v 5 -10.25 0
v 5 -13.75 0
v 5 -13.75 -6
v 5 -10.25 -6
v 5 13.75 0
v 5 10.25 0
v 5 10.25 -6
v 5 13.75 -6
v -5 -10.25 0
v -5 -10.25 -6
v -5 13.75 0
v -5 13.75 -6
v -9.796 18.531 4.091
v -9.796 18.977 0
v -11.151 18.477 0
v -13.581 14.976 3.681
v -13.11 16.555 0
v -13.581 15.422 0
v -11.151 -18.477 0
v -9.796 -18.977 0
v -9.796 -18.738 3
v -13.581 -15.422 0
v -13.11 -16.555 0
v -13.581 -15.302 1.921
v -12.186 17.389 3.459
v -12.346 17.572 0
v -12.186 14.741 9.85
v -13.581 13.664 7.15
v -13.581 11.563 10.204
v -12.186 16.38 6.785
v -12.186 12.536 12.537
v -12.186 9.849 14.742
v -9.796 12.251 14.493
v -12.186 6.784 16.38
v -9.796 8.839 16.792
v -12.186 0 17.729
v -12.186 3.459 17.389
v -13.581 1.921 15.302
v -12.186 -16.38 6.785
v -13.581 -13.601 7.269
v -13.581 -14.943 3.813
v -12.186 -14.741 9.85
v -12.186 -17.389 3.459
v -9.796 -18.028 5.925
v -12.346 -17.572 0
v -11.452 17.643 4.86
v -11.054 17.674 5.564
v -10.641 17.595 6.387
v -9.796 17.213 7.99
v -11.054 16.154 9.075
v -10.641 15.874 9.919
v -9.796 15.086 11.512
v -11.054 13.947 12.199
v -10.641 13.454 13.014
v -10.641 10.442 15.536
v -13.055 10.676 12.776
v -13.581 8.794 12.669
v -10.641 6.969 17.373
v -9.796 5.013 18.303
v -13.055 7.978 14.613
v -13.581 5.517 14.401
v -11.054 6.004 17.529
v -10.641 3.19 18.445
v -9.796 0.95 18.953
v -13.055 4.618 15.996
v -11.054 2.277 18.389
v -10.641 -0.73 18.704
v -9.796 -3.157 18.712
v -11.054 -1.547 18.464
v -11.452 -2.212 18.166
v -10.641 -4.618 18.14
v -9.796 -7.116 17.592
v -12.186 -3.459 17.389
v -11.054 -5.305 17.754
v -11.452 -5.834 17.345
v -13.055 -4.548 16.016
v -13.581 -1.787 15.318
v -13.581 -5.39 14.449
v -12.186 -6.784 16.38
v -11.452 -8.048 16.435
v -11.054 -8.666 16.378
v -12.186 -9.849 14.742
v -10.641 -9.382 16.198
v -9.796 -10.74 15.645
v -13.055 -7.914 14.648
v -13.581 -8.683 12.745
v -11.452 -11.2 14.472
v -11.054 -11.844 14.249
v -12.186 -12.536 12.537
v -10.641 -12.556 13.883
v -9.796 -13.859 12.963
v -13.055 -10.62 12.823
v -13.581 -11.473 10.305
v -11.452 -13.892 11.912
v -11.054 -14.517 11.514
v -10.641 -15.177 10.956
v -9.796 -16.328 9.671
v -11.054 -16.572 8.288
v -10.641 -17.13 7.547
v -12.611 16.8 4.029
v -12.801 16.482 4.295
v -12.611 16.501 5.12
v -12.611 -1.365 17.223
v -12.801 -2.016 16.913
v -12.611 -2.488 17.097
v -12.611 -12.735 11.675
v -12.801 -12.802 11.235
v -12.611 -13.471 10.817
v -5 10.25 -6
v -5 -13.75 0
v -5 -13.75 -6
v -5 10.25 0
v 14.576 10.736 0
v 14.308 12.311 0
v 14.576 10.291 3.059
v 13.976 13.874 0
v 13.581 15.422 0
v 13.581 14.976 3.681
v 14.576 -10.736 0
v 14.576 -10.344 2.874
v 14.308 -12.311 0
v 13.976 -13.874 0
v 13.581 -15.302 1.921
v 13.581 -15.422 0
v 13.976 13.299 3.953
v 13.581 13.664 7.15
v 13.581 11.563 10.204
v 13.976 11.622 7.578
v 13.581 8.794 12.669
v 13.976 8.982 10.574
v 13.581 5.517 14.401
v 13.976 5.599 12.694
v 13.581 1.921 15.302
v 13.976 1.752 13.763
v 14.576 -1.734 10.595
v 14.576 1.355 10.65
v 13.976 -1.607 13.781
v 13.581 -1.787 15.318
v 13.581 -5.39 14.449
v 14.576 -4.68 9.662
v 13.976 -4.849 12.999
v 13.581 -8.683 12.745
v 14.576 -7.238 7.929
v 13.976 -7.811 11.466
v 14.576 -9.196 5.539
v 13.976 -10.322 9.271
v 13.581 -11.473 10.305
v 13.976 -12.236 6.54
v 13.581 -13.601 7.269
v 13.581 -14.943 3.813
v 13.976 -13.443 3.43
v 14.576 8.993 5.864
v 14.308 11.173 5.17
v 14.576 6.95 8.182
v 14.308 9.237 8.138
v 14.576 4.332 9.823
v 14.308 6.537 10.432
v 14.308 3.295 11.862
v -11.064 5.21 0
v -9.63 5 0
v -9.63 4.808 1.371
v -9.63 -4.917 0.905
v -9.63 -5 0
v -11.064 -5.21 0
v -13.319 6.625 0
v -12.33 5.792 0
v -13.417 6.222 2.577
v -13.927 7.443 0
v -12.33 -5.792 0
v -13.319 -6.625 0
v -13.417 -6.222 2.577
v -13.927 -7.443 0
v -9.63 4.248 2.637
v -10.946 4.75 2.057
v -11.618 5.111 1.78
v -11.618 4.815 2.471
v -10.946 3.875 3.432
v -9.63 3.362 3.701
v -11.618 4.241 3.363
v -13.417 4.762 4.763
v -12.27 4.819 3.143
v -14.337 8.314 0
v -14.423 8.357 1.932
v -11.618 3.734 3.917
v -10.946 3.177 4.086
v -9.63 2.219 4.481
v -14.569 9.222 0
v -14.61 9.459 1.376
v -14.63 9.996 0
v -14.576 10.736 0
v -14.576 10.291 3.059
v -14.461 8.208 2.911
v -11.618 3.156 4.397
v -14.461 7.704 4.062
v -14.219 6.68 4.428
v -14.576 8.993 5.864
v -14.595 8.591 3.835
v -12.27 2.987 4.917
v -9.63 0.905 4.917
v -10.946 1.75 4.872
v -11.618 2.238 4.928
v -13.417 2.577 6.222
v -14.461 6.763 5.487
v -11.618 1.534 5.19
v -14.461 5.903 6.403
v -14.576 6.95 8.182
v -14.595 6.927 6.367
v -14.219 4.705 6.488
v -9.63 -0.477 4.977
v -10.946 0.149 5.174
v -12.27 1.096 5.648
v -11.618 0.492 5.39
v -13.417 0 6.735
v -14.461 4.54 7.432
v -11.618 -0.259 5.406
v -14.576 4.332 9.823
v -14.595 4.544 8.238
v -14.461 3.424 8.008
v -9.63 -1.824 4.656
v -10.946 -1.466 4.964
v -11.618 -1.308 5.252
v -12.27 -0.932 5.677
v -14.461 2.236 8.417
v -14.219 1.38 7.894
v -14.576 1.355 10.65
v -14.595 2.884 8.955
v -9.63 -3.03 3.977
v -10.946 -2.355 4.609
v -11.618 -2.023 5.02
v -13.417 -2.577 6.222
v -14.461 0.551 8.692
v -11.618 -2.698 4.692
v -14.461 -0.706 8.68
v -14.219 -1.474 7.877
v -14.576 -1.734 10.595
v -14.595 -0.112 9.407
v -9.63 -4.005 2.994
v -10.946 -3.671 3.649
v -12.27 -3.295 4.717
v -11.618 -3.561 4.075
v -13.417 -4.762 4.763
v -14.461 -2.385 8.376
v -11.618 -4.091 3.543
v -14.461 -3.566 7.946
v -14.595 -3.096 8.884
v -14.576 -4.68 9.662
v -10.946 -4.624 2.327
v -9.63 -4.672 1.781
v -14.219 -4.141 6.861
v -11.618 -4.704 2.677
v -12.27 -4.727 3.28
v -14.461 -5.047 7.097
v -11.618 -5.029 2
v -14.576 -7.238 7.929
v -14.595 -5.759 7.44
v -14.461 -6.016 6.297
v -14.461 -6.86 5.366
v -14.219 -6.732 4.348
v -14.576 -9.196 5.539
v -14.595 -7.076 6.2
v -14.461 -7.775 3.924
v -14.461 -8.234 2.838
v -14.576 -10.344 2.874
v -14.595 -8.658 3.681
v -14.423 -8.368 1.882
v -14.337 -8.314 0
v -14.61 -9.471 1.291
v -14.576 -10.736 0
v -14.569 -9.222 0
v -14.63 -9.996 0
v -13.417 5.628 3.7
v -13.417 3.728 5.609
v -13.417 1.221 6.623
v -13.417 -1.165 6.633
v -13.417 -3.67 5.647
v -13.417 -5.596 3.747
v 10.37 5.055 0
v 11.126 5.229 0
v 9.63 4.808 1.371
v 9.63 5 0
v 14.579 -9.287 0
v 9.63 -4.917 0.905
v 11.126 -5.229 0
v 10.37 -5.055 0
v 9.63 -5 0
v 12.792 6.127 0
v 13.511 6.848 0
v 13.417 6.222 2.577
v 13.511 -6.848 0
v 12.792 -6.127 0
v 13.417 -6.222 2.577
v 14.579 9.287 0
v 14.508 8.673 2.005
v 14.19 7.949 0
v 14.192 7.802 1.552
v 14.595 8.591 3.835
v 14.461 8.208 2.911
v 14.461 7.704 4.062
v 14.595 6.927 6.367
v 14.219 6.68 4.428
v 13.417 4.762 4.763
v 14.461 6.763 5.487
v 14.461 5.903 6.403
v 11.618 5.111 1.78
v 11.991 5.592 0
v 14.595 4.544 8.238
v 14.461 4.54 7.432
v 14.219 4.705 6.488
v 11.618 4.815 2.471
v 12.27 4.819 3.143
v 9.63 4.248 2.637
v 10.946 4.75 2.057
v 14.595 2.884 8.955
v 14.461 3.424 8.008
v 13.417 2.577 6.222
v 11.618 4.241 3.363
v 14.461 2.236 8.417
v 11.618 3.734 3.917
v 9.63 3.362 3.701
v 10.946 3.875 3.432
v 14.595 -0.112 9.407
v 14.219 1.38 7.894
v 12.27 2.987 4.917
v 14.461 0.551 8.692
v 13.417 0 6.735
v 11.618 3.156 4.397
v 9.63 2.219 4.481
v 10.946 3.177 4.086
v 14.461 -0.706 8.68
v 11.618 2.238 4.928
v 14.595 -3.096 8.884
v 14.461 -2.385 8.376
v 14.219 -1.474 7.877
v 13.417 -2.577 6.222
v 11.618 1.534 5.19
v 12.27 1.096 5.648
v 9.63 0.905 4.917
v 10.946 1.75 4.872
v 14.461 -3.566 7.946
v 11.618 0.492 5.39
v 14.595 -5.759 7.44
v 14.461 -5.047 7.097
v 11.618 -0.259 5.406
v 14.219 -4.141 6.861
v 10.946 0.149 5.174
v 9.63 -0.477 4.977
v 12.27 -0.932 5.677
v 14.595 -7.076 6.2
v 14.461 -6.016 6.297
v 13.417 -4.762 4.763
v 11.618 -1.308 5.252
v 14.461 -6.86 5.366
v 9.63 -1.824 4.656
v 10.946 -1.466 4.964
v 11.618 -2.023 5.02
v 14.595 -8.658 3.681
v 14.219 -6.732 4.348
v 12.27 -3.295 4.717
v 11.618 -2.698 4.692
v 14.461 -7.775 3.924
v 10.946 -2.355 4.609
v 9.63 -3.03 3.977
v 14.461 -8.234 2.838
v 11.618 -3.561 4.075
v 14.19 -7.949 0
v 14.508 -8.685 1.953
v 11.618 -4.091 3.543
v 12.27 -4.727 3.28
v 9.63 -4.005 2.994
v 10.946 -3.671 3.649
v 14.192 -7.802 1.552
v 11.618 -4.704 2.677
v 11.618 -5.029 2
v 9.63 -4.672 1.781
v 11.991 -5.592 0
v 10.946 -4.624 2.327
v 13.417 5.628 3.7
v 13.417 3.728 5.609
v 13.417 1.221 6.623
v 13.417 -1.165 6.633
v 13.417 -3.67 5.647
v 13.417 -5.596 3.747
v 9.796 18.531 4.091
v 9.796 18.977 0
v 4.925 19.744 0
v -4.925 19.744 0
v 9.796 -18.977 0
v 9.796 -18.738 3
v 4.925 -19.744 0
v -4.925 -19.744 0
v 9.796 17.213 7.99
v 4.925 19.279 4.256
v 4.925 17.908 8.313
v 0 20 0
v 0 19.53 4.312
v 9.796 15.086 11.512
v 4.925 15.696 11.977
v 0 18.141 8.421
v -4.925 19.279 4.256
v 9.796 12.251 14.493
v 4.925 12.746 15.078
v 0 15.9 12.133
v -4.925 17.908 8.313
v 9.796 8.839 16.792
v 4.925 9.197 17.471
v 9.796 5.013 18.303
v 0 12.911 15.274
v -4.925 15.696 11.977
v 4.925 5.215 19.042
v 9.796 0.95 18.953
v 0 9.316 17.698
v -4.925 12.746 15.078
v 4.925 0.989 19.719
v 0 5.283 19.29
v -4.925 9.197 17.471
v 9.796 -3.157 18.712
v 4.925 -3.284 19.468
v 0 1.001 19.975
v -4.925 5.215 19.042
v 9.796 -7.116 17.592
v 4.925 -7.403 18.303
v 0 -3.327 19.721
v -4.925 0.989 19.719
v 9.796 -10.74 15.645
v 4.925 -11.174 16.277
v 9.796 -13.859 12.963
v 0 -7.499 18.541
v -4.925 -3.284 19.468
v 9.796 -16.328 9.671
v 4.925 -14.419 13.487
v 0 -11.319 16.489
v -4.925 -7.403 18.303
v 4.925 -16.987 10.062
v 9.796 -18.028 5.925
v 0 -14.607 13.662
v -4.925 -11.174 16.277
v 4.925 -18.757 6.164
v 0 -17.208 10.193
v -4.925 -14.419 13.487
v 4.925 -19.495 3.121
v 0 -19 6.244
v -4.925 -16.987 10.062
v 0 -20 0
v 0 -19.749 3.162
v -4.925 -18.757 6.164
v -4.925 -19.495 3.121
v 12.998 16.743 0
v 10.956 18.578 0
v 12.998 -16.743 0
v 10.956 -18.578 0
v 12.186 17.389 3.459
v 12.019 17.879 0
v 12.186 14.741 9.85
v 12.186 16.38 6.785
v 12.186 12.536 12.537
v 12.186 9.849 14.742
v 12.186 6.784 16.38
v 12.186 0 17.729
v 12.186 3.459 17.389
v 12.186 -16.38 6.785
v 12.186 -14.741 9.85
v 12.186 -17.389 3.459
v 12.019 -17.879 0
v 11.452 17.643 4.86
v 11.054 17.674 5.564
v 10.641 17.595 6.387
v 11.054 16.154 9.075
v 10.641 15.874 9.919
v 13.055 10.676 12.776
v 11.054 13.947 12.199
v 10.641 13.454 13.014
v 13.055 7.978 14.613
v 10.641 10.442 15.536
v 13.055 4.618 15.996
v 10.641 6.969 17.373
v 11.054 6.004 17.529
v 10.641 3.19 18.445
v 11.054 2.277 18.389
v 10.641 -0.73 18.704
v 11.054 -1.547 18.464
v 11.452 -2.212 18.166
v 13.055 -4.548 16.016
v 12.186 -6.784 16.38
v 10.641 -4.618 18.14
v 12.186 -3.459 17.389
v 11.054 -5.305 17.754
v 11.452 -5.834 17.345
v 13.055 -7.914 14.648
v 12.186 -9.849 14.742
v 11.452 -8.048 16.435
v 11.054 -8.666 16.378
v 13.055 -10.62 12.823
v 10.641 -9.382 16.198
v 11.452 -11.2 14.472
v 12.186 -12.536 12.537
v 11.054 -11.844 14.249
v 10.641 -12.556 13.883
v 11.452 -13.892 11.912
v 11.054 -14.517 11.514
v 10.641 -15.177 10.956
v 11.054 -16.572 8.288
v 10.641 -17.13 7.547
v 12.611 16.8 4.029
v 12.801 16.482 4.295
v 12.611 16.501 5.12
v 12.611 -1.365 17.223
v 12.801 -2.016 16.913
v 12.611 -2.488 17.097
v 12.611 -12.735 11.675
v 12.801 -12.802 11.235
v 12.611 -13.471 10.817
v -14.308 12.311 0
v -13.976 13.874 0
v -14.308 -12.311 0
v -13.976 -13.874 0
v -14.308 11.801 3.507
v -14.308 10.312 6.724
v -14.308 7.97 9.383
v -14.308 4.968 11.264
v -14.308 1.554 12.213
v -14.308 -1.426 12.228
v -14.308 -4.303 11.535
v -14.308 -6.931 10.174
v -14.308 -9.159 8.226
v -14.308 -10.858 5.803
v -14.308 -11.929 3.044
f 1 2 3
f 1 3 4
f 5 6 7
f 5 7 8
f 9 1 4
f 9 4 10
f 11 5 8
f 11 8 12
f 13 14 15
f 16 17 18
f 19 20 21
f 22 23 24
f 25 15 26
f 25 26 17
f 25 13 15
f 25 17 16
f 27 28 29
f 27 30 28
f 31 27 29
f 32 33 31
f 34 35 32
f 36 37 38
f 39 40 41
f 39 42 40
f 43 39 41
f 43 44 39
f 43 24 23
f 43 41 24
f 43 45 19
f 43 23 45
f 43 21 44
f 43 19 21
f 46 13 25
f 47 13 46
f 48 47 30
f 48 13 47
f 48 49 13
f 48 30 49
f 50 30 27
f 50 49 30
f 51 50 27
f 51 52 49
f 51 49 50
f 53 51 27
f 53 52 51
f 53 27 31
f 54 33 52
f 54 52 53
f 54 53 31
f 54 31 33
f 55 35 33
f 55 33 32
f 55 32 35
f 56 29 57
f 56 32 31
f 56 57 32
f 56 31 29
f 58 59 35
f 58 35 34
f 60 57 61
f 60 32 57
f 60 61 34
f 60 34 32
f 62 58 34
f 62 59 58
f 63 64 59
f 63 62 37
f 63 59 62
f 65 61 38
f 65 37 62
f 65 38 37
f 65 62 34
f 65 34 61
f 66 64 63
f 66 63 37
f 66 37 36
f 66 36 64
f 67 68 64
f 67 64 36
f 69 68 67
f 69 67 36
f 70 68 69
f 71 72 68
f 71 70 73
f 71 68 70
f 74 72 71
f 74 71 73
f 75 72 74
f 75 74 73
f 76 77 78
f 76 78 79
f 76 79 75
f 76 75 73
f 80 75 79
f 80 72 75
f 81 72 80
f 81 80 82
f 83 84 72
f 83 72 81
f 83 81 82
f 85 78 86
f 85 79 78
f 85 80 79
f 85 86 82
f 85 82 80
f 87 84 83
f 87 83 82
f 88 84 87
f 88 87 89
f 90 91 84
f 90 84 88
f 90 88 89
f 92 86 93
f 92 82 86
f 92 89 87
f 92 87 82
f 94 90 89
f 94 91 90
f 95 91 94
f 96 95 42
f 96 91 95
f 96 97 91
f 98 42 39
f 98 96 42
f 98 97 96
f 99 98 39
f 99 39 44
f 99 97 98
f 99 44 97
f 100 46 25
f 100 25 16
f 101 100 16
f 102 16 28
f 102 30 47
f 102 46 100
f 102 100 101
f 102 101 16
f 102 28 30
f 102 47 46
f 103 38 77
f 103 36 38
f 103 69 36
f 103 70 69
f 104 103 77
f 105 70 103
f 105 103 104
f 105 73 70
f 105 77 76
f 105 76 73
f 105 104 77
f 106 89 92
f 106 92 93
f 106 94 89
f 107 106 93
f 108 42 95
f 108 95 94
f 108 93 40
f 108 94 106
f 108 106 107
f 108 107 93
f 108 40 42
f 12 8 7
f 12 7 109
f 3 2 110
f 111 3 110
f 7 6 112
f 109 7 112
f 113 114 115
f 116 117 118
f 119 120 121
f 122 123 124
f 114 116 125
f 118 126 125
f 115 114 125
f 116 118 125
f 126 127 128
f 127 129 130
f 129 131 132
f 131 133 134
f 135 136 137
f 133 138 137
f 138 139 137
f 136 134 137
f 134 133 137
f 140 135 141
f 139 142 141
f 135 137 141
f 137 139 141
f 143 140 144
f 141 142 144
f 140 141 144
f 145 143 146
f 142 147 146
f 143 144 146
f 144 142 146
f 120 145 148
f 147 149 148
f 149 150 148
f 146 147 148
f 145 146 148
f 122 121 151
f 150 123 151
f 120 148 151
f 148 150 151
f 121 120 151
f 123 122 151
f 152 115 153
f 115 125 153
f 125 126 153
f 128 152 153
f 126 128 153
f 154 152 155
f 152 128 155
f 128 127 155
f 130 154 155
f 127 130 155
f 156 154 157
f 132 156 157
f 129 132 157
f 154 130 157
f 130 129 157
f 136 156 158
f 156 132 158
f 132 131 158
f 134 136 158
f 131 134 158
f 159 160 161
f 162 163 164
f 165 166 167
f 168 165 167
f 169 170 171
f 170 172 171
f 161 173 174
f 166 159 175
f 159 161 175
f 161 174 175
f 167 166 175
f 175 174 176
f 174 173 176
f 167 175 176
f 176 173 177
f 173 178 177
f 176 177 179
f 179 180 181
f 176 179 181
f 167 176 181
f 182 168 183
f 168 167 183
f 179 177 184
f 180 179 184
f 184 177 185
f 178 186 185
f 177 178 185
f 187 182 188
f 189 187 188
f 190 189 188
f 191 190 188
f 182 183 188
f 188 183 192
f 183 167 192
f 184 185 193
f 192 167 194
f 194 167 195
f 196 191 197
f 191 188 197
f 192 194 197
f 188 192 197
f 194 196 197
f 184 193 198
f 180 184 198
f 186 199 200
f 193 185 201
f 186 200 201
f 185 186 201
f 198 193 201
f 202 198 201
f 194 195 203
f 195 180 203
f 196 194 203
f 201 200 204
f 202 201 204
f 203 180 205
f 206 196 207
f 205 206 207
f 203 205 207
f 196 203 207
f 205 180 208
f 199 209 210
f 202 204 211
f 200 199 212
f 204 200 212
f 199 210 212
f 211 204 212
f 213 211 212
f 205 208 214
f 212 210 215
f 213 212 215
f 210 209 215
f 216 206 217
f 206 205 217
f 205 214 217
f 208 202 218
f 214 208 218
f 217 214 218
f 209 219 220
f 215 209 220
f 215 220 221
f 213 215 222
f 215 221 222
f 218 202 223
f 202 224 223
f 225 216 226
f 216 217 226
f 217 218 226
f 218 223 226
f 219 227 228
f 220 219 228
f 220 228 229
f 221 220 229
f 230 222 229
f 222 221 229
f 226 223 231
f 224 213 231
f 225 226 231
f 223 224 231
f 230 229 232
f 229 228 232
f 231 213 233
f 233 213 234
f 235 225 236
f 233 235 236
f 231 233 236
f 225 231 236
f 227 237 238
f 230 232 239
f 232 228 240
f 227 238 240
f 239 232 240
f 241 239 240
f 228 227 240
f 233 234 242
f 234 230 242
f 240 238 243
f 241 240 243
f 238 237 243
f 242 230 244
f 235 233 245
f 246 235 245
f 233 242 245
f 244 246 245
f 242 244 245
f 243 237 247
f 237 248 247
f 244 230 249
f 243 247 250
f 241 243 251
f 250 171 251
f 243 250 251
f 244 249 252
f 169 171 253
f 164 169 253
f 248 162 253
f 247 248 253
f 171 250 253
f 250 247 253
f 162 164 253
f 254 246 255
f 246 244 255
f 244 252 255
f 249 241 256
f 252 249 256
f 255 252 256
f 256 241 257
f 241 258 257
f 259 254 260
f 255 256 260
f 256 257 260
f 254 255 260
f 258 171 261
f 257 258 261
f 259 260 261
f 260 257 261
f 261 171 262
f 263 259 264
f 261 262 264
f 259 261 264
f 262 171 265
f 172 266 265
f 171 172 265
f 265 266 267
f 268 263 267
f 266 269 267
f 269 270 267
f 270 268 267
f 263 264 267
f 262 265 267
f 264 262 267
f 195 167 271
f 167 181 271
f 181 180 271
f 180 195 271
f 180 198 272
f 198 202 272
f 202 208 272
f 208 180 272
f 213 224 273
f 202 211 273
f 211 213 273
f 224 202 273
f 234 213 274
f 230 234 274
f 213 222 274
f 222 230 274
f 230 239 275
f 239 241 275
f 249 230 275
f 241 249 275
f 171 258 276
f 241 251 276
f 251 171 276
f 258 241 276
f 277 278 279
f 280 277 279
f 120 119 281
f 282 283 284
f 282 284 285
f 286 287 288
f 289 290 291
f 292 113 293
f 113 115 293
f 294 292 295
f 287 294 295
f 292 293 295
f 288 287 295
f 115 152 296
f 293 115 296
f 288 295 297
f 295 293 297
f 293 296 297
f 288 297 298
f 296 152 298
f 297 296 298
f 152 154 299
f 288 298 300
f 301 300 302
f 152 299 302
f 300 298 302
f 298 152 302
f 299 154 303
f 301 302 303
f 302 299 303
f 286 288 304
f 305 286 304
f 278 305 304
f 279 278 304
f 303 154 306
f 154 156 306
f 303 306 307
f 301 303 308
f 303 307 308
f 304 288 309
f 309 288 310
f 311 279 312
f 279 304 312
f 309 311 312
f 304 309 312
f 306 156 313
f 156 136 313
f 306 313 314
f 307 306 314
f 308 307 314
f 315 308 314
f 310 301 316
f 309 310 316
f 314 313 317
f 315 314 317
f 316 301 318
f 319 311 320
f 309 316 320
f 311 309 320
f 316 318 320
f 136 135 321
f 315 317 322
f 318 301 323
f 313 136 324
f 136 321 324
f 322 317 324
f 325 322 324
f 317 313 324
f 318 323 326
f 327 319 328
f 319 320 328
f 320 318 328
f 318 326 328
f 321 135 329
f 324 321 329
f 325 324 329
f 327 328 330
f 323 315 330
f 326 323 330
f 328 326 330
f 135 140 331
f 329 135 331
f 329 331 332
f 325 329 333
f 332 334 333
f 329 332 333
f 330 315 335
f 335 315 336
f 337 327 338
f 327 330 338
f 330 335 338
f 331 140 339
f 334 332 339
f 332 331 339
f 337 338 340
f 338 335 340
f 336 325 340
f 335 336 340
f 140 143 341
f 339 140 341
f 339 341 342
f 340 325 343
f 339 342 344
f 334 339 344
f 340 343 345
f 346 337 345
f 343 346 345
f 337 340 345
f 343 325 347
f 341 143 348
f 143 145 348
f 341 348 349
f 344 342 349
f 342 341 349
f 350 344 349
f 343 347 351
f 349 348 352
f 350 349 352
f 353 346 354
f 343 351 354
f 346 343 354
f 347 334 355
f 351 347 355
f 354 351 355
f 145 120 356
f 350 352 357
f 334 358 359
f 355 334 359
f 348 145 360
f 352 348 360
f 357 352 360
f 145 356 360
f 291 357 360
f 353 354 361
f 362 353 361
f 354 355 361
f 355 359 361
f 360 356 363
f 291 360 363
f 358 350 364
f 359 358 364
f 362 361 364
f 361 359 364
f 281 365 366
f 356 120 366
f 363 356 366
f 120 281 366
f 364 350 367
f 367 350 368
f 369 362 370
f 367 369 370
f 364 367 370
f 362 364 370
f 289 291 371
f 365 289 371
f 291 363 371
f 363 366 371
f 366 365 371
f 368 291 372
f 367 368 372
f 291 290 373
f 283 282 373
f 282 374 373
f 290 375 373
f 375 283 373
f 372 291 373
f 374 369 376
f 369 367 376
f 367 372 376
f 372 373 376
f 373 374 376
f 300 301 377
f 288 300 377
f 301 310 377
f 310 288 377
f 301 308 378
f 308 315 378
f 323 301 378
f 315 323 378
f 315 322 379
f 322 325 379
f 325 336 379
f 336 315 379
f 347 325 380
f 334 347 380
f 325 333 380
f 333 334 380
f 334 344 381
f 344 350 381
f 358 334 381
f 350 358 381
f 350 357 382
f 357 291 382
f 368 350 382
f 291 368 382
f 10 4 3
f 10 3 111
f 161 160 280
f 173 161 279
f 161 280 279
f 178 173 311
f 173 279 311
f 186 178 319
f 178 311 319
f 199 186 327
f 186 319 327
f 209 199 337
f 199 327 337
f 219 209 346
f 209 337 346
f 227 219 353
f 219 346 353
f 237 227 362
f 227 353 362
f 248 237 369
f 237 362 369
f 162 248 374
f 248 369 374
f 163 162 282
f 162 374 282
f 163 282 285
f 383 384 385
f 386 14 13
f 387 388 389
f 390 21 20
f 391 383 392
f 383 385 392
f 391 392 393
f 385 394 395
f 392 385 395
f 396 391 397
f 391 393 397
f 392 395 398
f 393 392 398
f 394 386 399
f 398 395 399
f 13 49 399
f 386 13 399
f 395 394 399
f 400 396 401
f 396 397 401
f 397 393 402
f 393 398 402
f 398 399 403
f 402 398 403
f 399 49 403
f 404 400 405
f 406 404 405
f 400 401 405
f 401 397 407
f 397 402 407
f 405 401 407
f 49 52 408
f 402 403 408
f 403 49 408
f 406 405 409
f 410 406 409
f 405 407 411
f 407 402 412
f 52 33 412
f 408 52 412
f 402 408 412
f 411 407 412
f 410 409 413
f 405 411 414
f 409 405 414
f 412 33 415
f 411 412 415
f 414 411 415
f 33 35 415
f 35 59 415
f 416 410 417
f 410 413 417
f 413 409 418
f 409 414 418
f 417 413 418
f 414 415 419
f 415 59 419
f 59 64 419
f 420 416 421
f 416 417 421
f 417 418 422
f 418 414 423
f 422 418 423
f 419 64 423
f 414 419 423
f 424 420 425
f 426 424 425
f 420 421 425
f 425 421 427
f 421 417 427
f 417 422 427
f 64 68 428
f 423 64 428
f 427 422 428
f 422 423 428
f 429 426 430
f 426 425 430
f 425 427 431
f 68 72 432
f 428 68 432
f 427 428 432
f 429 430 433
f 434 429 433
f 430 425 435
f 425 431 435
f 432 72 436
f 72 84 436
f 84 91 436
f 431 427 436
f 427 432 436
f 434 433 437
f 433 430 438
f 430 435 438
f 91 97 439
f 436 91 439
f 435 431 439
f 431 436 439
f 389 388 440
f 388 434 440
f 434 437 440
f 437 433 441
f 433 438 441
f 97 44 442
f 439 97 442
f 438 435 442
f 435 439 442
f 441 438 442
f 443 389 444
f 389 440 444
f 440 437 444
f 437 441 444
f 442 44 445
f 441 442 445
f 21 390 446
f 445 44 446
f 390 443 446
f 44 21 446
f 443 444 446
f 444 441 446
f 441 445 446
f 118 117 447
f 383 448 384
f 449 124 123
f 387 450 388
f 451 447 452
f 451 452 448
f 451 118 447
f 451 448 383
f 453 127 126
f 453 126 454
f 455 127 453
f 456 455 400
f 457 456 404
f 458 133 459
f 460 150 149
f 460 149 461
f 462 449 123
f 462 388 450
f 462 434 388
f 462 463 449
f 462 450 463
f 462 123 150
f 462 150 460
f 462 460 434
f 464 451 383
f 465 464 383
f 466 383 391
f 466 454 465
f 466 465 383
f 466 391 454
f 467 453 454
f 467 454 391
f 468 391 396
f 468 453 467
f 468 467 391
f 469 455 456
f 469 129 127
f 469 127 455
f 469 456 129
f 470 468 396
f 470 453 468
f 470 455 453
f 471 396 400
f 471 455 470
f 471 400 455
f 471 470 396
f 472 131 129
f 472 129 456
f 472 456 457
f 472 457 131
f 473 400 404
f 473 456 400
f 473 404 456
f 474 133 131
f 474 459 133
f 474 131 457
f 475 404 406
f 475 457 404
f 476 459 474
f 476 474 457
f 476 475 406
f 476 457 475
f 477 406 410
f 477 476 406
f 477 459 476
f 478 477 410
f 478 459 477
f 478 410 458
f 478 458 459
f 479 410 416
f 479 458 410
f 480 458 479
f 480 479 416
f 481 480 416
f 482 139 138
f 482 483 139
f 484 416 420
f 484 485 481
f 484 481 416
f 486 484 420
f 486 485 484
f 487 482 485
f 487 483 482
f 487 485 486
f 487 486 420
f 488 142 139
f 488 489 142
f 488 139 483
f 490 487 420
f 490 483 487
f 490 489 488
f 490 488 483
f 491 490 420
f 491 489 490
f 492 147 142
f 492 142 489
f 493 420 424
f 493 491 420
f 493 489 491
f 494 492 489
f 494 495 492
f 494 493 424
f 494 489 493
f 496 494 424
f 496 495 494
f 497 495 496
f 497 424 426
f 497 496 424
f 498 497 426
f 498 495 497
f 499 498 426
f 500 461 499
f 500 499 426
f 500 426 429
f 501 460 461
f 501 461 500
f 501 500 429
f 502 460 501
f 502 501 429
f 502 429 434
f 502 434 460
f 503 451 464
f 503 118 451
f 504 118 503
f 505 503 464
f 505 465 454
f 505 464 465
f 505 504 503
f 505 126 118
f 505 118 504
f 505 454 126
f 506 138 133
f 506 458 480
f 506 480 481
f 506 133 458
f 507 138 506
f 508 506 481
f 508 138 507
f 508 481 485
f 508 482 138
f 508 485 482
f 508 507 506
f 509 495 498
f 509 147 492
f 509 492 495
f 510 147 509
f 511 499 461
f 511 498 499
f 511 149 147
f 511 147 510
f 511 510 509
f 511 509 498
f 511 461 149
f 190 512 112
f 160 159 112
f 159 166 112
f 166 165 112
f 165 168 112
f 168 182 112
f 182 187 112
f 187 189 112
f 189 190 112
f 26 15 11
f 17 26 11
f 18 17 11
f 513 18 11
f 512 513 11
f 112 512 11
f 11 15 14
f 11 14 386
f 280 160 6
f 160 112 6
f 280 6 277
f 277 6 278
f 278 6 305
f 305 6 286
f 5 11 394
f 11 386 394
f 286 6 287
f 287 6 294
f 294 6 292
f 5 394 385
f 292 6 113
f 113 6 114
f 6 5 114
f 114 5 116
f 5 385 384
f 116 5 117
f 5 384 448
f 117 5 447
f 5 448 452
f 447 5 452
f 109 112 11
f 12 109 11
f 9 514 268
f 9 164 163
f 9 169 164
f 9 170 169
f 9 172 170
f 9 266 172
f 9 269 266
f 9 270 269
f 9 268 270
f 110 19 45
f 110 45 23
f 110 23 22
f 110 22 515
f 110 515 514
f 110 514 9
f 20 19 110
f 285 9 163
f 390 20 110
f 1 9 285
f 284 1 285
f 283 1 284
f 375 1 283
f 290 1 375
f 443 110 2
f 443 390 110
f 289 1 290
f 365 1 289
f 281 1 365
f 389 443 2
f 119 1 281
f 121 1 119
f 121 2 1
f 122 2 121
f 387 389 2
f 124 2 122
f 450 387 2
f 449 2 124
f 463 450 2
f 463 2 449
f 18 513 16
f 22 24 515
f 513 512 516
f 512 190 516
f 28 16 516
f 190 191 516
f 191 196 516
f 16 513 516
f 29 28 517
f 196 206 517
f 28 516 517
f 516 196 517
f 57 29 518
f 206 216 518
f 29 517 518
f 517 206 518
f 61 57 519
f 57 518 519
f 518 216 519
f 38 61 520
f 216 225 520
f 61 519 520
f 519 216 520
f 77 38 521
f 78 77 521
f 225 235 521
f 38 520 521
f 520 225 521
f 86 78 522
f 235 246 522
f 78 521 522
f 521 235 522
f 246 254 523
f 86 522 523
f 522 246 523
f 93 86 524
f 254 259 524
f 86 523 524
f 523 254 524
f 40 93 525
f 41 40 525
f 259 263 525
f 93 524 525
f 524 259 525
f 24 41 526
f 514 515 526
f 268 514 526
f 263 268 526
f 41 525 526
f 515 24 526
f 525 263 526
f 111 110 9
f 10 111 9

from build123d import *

# Parameters (mm, degrees)
REVOLVE_1_ANGLE = 180
FILLET_1_R      = 5
FILLET_2_R      = 5
SKETCH_3_W      = 10
SKETCH_3_H      = 3.5
EXTRUDE_1_DEPTH = 6


with BuildPart() as part:
    # 草图1 → 旋转1 (revolve)
    with BuildSketch(Plane.XY):
        with BuildLine():
            Line((-15, 5), (15, 5))
            ThreePointArc((15, 5), (14.412847263, 11.739422714), (12.669081334, 18.275770872))
            ThreePointArc((12.669081334, 18.275770872), (0, 20), (-12.669081334, 18.275770872))
            ThreePointArc((-12.669081334, 18.275770872), (-14.412847263, 11.739422714), (-15, 5))
        make_face()
    revolve(axis=Axis((-17.5, 0, 0), (1, 0, 0)), revolution_arc=REVOLVE_1_ANGLE)

    # 圆角1
    fillet_1_edges = [part.edges().sort_by_distance(p)[0] for p in [
        (12.669081334, 0, 18.275770872),
        (-12.669081334, 0, 18.275770872),
    ]]
    fillet(fillet_1_edges, radius=FILLET_1_R)

    # 圆角2
    fillet_2_edges = [part.edges().sort_by_distance(p)[0] for p in [
        (-15, 0, 5),
        (15, 0, 5),
    ]]
    fillet(fillet_2_edges, radius=FILLET_2_R)

    # 草图3 → 凸台-拉伸1 (add)
    with BuildSketch(Plane(origin=(0, 0, 0), x_dir=(-1, 0, 0), z_dir=(0, 0, -1))):
        with Locations((0, 12)):
            Rectangle(SKETCH_3_W, SKETCH_3_H)
        with Locations((0, -12)):
            Rectangle(SKETCH_3_W, SKETCH_3_H)
    extrude(amount=EXTRUDE_1_DEPTH)


solid = part.part
